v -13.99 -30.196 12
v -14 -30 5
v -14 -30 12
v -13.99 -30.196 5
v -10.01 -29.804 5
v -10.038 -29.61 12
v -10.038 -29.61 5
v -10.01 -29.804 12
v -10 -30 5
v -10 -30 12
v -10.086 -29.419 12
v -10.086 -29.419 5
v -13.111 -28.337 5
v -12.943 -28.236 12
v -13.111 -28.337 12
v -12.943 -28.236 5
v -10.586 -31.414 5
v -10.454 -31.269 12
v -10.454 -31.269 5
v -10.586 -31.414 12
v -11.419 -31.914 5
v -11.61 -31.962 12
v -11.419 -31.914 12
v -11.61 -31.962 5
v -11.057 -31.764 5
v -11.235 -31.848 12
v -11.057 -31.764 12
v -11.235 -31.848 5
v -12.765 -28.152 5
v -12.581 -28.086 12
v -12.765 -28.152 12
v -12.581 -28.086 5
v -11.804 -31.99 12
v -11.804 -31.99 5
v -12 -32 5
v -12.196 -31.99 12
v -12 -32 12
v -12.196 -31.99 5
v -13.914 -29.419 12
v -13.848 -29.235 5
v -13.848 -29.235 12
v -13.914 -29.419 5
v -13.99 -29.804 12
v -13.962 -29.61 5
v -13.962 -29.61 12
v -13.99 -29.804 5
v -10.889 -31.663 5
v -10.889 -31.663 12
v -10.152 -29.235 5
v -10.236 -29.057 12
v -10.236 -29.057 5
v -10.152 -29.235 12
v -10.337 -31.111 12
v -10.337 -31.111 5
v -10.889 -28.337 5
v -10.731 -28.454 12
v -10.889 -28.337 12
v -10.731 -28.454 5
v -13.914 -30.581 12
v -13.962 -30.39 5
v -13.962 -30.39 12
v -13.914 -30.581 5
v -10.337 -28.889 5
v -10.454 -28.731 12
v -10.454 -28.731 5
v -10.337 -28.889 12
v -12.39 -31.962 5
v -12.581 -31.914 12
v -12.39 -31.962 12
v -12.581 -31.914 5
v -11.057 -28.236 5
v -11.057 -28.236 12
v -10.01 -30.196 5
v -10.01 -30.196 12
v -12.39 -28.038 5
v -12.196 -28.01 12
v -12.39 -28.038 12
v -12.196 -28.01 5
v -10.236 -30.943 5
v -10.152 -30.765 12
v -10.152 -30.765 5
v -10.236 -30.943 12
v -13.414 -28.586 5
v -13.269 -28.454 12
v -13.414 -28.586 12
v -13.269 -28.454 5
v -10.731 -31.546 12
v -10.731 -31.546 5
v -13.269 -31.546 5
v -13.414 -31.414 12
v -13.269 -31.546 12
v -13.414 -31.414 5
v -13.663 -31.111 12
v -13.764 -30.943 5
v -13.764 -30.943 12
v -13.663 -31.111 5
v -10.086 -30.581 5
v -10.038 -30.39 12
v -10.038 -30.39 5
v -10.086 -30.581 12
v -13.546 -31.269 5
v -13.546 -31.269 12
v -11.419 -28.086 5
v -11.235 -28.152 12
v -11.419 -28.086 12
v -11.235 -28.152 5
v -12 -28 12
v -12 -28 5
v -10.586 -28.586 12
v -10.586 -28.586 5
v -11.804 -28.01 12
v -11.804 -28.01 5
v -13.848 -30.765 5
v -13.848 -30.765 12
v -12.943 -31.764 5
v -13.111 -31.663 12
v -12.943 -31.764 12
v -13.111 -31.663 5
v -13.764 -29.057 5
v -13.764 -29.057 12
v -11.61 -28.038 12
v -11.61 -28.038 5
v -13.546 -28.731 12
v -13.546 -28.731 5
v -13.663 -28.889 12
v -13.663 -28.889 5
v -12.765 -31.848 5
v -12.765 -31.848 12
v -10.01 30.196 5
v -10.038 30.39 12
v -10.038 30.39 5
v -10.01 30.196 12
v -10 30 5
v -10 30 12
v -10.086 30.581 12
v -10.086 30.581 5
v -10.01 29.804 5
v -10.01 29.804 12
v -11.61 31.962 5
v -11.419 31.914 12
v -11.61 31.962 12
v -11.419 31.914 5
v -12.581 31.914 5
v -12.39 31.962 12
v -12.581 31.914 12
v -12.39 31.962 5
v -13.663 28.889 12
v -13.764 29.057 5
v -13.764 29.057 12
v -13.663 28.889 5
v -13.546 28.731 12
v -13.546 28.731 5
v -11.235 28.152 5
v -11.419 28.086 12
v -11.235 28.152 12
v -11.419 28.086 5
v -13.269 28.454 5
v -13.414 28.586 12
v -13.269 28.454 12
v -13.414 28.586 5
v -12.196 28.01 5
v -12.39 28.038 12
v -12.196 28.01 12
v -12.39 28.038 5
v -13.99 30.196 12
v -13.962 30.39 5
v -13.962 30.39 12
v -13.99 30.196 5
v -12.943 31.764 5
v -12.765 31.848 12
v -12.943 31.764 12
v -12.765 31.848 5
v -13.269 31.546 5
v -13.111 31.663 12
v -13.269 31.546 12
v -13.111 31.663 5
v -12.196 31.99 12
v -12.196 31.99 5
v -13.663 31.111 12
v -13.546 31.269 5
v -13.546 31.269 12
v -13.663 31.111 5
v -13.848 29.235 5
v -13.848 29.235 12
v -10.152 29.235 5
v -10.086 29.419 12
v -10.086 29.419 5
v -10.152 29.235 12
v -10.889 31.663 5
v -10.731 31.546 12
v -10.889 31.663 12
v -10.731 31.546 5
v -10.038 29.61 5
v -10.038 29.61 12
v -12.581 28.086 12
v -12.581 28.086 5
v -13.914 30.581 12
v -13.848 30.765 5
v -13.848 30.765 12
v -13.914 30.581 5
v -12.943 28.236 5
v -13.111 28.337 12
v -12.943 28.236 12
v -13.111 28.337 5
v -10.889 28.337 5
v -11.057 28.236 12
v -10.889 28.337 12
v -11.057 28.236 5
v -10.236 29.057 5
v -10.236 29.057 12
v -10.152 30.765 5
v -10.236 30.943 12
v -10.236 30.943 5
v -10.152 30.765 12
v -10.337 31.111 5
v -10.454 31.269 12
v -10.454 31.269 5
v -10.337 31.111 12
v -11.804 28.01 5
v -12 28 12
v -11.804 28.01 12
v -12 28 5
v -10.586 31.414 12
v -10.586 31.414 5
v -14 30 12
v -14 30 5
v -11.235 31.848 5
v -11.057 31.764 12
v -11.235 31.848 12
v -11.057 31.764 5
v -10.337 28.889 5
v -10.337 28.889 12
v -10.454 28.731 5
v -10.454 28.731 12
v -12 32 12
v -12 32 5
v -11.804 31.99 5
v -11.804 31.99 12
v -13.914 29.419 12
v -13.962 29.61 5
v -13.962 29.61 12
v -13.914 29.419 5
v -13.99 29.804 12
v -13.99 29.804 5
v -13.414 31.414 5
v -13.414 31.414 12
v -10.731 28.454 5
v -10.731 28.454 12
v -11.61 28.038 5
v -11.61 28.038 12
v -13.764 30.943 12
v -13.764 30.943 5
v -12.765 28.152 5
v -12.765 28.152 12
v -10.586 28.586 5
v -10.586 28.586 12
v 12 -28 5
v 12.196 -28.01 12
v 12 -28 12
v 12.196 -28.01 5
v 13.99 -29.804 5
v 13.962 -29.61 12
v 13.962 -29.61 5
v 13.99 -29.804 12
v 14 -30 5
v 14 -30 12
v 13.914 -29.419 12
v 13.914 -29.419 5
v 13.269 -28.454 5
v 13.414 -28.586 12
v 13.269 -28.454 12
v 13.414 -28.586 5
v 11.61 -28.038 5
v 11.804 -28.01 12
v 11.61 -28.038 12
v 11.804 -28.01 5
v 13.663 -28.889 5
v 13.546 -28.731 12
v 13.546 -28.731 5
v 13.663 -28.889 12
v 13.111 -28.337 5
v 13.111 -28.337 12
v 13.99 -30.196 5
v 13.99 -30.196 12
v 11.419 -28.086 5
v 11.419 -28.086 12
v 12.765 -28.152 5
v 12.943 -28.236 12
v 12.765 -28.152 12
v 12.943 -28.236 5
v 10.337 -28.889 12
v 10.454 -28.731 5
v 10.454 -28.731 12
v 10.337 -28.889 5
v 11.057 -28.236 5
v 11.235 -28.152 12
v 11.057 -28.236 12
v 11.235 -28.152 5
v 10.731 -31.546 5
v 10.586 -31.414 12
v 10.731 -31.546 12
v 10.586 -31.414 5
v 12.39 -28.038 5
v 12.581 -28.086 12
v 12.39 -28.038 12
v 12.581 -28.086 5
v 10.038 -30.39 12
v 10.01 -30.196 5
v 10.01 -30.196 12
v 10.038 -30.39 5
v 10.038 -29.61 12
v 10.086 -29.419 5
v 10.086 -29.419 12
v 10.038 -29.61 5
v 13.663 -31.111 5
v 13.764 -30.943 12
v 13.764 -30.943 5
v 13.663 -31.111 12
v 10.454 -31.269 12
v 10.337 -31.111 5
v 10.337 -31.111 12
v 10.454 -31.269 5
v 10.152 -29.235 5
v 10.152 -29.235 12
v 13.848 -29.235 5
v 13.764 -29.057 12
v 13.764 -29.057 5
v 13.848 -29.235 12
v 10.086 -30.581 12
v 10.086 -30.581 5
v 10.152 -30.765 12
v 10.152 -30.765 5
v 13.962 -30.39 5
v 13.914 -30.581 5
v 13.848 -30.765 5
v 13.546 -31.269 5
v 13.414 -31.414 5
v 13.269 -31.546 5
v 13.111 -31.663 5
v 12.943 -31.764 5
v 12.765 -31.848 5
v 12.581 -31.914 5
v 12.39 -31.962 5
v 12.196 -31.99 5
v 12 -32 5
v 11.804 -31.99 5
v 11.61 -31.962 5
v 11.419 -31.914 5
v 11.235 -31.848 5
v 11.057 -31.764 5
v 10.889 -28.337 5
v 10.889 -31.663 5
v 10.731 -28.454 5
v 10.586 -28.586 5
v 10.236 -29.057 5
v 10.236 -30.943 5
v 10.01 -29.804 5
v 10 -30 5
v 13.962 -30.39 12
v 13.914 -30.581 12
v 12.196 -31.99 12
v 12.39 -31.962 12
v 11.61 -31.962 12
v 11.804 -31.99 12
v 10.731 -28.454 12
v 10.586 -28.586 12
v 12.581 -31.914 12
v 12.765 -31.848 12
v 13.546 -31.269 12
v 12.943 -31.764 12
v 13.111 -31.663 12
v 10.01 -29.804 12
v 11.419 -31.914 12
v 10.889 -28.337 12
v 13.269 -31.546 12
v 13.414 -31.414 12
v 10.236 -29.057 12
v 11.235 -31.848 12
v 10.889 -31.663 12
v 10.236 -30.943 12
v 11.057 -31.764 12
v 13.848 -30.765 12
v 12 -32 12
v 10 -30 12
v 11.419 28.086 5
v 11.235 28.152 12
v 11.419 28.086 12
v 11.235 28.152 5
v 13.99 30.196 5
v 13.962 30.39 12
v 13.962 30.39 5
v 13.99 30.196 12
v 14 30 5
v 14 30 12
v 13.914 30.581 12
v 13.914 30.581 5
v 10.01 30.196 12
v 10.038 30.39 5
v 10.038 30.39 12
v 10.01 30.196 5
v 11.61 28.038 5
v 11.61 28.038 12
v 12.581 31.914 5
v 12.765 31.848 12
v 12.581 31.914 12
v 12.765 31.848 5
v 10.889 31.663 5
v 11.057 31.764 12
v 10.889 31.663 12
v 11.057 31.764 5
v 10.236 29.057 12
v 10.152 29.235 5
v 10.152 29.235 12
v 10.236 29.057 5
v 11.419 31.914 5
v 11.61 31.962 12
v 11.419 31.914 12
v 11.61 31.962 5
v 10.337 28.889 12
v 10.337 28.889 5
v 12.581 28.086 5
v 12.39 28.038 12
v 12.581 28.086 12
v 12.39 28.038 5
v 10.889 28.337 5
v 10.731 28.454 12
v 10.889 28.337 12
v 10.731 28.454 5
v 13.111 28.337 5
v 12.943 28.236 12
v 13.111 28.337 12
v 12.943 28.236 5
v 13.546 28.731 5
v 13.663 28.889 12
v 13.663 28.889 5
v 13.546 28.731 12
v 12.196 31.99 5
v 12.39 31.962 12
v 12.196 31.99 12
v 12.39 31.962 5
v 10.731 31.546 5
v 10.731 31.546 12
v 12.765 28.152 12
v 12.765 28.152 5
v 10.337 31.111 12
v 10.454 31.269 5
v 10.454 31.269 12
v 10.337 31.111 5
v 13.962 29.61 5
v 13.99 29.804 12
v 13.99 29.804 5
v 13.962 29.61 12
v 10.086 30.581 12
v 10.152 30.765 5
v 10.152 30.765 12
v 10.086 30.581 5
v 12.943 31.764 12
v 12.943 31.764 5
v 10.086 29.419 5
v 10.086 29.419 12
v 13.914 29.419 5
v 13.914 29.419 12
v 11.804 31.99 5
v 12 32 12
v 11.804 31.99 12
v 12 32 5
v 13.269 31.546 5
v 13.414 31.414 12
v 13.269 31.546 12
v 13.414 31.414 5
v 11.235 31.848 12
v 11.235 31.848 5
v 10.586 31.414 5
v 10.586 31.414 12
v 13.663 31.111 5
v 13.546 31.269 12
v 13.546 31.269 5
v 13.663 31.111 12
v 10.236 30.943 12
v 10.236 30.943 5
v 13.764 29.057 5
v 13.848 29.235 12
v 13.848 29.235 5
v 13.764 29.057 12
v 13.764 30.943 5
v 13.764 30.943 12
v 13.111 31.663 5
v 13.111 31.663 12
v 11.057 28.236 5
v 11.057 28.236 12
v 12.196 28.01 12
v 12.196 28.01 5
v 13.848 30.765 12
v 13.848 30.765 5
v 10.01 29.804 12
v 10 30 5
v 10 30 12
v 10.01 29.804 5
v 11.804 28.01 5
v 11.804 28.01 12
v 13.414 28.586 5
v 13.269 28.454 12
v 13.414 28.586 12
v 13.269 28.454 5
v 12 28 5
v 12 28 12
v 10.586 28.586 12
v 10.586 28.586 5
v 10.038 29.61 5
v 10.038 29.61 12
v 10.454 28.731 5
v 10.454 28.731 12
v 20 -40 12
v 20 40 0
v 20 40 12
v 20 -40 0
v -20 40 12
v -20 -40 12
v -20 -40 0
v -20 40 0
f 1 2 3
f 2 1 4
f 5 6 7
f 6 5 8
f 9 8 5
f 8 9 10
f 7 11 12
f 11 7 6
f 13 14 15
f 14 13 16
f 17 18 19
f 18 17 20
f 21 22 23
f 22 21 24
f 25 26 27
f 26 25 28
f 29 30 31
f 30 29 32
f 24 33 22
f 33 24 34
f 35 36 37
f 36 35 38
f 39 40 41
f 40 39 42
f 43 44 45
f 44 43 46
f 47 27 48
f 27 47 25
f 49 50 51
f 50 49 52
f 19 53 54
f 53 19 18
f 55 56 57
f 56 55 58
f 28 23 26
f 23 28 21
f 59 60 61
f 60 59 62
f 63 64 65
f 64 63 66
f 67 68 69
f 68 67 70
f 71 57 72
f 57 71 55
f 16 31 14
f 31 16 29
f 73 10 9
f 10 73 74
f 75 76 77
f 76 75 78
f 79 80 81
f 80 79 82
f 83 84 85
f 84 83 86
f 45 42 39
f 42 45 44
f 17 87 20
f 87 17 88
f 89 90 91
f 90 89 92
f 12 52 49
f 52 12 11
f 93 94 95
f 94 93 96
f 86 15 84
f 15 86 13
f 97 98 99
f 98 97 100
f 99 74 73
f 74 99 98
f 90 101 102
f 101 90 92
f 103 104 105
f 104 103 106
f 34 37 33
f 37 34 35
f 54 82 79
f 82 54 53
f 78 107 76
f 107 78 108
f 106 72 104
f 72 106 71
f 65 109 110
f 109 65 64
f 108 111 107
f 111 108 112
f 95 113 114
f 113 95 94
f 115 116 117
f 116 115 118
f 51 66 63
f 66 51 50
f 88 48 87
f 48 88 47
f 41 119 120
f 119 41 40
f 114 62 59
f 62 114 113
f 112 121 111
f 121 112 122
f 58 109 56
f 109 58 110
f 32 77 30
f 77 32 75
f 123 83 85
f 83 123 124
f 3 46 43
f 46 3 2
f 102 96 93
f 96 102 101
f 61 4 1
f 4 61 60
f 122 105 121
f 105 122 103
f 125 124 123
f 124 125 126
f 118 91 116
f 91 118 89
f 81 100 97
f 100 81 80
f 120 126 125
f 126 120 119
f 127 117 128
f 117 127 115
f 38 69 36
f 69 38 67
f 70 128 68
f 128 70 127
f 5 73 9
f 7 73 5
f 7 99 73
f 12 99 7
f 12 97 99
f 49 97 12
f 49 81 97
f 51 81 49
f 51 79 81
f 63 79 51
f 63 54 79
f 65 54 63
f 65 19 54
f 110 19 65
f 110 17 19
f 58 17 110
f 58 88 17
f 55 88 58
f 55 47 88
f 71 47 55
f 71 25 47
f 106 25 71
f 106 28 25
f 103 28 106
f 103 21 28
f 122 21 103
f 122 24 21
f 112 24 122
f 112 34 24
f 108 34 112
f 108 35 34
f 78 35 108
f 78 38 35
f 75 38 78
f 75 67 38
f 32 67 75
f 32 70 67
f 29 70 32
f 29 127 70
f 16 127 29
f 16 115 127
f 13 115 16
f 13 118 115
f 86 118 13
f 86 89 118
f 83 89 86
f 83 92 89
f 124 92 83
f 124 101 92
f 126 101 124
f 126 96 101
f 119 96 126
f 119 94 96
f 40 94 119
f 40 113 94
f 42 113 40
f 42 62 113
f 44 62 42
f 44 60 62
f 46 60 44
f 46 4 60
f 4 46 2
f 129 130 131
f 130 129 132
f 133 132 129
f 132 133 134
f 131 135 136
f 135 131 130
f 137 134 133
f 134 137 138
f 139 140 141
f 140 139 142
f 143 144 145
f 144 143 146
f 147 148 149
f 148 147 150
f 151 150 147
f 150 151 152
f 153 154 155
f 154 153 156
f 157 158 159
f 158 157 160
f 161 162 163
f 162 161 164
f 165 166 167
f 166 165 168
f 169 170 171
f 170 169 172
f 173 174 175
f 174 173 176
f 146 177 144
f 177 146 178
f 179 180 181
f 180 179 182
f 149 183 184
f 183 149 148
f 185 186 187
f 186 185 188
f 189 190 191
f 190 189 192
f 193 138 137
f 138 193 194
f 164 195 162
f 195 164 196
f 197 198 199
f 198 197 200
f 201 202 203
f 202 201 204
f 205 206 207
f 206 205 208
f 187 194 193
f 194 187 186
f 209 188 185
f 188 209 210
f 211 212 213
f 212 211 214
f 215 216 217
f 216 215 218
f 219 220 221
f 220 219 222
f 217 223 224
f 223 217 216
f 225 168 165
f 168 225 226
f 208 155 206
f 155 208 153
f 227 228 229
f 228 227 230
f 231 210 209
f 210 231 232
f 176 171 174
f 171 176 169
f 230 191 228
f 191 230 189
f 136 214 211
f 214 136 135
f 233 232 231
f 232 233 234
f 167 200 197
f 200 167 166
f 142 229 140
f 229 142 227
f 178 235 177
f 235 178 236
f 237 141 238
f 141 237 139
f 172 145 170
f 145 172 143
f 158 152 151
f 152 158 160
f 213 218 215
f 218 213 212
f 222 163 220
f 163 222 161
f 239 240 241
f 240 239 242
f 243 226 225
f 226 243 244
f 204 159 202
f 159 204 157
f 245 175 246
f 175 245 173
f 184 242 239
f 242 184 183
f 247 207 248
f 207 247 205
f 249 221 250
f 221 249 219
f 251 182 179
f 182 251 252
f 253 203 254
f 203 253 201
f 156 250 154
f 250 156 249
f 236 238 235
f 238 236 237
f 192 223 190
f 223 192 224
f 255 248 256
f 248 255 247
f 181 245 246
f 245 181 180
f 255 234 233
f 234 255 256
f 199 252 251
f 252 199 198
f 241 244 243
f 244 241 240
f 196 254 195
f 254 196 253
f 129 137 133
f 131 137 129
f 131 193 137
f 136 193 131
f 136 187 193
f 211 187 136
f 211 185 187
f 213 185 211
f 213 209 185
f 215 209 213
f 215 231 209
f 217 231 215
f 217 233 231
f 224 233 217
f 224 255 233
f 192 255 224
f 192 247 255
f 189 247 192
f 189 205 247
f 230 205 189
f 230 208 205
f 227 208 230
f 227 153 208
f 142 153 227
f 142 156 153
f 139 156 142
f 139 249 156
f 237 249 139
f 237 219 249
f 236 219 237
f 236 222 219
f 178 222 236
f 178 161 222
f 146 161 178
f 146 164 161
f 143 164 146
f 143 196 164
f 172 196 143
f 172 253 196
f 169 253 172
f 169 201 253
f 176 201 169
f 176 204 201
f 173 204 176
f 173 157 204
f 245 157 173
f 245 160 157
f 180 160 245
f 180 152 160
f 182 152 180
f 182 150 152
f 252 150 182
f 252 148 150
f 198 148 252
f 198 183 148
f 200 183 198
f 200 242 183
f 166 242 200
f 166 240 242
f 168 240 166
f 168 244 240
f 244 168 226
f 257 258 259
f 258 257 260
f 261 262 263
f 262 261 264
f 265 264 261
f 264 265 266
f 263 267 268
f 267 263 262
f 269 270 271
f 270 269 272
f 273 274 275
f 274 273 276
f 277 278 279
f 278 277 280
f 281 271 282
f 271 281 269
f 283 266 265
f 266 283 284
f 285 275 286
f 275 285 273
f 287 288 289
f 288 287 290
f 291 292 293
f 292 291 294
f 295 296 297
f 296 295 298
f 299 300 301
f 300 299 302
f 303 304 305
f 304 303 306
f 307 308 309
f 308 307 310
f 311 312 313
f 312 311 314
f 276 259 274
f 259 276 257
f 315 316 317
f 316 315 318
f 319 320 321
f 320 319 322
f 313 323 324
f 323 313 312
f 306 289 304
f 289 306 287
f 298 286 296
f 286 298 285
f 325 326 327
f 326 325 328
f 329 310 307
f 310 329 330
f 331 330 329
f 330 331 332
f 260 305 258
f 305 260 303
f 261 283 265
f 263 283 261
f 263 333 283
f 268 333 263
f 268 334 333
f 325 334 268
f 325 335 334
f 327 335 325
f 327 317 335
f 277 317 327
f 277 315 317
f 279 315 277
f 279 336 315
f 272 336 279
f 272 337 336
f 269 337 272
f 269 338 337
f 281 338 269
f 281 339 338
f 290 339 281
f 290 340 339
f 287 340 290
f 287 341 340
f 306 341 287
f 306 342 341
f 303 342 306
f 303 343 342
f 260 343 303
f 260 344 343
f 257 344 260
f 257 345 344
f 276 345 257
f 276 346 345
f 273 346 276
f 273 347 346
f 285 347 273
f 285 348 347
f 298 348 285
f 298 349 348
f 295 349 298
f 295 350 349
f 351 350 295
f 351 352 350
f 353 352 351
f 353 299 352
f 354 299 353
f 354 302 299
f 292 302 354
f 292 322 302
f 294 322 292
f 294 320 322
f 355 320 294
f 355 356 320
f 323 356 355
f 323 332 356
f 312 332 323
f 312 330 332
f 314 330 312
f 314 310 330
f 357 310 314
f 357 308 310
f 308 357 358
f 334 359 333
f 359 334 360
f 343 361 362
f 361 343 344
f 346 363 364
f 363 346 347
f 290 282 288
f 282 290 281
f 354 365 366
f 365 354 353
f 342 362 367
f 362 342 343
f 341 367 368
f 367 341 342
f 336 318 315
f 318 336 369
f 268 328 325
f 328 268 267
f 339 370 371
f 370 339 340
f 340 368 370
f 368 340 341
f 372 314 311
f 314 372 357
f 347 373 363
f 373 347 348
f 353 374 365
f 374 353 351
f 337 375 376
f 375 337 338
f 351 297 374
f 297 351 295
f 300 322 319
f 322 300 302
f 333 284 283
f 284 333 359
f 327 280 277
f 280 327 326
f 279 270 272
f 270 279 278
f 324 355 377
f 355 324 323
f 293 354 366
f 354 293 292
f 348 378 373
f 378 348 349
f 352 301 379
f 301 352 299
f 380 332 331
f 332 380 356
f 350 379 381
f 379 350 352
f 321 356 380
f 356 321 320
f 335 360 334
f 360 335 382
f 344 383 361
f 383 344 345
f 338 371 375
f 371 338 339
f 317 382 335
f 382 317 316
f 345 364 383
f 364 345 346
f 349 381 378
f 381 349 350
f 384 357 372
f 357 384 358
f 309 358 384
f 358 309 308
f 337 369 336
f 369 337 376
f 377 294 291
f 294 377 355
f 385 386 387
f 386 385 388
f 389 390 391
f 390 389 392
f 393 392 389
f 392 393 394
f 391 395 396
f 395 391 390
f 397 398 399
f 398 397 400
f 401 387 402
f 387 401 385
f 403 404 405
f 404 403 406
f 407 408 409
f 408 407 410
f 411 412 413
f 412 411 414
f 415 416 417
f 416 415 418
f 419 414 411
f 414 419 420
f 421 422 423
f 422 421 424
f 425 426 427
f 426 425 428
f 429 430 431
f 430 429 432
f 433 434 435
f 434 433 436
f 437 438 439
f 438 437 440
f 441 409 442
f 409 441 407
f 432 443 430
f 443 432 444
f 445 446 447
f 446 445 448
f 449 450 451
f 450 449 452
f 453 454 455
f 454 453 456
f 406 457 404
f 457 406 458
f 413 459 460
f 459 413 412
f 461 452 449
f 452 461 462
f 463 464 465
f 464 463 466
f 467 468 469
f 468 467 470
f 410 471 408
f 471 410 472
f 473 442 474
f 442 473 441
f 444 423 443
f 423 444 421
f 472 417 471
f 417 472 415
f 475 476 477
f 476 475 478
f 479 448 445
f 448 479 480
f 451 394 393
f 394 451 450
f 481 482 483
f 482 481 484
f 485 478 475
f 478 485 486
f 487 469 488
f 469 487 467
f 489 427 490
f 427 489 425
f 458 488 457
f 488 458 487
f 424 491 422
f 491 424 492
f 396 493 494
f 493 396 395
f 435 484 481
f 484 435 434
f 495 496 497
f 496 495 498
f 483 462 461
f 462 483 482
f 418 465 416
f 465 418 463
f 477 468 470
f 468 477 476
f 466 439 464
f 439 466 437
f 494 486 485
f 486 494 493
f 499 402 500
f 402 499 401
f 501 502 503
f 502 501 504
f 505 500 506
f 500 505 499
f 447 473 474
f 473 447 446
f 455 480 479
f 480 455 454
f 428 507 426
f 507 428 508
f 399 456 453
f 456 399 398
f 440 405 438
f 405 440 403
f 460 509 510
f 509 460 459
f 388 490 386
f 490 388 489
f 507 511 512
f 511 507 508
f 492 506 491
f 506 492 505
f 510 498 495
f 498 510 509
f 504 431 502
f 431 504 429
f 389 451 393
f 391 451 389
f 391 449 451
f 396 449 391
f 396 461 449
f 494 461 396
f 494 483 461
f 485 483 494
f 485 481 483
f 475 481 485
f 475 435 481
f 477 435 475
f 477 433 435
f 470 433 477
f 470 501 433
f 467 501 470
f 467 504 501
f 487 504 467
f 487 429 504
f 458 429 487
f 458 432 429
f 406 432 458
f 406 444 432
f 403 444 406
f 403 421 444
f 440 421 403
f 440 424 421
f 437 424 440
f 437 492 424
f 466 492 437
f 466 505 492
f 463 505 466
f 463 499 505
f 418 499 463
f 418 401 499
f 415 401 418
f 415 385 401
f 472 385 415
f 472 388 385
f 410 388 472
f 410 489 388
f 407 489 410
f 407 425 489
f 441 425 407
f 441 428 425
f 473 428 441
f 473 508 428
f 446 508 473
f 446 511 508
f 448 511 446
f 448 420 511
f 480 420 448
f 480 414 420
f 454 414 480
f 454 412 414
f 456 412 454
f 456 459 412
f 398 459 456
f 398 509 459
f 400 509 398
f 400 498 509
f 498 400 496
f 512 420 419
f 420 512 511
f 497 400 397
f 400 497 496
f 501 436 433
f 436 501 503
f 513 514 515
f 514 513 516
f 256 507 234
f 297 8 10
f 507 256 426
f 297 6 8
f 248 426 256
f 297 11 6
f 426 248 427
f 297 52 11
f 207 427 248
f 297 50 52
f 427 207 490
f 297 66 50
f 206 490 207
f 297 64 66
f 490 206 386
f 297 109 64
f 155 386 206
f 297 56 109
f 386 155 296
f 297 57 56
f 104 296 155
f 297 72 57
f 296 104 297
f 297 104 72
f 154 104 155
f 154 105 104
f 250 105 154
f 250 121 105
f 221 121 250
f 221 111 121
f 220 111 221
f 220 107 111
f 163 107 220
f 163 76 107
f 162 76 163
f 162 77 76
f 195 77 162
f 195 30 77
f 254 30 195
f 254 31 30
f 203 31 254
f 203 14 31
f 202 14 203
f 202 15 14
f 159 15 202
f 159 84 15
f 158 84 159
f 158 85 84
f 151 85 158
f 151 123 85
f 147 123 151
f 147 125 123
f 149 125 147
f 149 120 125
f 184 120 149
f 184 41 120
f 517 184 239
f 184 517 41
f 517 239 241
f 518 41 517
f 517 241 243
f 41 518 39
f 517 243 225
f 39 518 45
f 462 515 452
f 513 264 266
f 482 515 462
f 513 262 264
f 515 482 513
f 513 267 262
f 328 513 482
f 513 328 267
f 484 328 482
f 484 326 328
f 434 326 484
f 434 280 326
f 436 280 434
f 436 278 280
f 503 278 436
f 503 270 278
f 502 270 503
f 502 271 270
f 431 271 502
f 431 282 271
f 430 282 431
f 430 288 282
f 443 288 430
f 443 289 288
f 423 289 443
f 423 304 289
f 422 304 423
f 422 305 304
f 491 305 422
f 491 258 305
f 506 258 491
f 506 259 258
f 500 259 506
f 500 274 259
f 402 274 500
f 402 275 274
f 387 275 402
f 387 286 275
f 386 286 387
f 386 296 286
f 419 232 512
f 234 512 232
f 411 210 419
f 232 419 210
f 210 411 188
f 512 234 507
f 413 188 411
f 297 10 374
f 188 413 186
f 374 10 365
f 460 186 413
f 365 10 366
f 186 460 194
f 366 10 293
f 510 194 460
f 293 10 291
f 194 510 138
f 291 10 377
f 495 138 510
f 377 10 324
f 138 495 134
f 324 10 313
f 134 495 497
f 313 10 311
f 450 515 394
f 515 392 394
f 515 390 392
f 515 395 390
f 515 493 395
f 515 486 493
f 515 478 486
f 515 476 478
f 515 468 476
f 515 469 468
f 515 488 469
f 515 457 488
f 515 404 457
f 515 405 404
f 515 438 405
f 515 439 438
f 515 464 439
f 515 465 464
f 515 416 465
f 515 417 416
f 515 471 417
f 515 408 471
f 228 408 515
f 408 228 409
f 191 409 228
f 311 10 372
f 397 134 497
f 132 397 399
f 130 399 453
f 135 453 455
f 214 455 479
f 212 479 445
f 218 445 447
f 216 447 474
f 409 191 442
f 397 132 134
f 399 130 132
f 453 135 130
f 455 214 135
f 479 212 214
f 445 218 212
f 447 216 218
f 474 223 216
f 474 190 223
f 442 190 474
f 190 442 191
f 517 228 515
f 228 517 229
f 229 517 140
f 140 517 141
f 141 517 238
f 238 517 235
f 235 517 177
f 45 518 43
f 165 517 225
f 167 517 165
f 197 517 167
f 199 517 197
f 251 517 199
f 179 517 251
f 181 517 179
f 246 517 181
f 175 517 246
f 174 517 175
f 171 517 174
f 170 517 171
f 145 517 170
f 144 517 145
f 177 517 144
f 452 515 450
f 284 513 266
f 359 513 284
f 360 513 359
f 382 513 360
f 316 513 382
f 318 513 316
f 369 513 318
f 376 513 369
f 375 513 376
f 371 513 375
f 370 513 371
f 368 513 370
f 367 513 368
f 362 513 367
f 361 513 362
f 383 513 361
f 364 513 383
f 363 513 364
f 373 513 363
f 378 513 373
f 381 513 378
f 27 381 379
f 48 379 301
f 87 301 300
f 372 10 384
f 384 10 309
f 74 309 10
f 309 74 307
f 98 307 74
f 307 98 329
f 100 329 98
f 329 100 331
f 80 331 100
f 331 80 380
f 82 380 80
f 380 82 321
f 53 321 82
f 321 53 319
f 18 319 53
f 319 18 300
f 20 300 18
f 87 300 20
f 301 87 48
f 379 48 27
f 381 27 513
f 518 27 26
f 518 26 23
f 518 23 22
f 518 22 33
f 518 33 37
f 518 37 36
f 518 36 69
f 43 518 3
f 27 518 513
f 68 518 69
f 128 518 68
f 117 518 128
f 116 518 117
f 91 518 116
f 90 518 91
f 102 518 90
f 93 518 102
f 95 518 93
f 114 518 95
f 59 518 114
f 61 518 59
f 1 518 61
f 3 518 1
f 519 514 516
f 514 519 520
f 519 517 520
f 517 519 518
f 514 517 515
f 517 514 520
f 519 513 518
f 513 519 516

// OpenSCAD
// The sensor plate for this task: 40 x 80 x 12 mm, four blind 4.0 mm holes 7.0 mm deep on a 24 x 60 mm pattern,
// for CNC Kitchen M3 standard heat-set inserts (5.7 mm long; hole 4.0 mm, about 1 mm deeper than the insert).
// Print flat in PETG: 0.2 mm layers, 4 perimeters, 30 % infill (about 40 g, 25 min). Export with: openscad -o plate.stl plate.scad
$fn = 64;
difference() {
    translate([-20, -40, 0]) cube([40, 80, 12]);
    for (x = [-12, 12]) for (y = [-30, 30])
        translate([x, y, 12 - 7]) cylinder(d = 4.0, h = 7.01);
}
